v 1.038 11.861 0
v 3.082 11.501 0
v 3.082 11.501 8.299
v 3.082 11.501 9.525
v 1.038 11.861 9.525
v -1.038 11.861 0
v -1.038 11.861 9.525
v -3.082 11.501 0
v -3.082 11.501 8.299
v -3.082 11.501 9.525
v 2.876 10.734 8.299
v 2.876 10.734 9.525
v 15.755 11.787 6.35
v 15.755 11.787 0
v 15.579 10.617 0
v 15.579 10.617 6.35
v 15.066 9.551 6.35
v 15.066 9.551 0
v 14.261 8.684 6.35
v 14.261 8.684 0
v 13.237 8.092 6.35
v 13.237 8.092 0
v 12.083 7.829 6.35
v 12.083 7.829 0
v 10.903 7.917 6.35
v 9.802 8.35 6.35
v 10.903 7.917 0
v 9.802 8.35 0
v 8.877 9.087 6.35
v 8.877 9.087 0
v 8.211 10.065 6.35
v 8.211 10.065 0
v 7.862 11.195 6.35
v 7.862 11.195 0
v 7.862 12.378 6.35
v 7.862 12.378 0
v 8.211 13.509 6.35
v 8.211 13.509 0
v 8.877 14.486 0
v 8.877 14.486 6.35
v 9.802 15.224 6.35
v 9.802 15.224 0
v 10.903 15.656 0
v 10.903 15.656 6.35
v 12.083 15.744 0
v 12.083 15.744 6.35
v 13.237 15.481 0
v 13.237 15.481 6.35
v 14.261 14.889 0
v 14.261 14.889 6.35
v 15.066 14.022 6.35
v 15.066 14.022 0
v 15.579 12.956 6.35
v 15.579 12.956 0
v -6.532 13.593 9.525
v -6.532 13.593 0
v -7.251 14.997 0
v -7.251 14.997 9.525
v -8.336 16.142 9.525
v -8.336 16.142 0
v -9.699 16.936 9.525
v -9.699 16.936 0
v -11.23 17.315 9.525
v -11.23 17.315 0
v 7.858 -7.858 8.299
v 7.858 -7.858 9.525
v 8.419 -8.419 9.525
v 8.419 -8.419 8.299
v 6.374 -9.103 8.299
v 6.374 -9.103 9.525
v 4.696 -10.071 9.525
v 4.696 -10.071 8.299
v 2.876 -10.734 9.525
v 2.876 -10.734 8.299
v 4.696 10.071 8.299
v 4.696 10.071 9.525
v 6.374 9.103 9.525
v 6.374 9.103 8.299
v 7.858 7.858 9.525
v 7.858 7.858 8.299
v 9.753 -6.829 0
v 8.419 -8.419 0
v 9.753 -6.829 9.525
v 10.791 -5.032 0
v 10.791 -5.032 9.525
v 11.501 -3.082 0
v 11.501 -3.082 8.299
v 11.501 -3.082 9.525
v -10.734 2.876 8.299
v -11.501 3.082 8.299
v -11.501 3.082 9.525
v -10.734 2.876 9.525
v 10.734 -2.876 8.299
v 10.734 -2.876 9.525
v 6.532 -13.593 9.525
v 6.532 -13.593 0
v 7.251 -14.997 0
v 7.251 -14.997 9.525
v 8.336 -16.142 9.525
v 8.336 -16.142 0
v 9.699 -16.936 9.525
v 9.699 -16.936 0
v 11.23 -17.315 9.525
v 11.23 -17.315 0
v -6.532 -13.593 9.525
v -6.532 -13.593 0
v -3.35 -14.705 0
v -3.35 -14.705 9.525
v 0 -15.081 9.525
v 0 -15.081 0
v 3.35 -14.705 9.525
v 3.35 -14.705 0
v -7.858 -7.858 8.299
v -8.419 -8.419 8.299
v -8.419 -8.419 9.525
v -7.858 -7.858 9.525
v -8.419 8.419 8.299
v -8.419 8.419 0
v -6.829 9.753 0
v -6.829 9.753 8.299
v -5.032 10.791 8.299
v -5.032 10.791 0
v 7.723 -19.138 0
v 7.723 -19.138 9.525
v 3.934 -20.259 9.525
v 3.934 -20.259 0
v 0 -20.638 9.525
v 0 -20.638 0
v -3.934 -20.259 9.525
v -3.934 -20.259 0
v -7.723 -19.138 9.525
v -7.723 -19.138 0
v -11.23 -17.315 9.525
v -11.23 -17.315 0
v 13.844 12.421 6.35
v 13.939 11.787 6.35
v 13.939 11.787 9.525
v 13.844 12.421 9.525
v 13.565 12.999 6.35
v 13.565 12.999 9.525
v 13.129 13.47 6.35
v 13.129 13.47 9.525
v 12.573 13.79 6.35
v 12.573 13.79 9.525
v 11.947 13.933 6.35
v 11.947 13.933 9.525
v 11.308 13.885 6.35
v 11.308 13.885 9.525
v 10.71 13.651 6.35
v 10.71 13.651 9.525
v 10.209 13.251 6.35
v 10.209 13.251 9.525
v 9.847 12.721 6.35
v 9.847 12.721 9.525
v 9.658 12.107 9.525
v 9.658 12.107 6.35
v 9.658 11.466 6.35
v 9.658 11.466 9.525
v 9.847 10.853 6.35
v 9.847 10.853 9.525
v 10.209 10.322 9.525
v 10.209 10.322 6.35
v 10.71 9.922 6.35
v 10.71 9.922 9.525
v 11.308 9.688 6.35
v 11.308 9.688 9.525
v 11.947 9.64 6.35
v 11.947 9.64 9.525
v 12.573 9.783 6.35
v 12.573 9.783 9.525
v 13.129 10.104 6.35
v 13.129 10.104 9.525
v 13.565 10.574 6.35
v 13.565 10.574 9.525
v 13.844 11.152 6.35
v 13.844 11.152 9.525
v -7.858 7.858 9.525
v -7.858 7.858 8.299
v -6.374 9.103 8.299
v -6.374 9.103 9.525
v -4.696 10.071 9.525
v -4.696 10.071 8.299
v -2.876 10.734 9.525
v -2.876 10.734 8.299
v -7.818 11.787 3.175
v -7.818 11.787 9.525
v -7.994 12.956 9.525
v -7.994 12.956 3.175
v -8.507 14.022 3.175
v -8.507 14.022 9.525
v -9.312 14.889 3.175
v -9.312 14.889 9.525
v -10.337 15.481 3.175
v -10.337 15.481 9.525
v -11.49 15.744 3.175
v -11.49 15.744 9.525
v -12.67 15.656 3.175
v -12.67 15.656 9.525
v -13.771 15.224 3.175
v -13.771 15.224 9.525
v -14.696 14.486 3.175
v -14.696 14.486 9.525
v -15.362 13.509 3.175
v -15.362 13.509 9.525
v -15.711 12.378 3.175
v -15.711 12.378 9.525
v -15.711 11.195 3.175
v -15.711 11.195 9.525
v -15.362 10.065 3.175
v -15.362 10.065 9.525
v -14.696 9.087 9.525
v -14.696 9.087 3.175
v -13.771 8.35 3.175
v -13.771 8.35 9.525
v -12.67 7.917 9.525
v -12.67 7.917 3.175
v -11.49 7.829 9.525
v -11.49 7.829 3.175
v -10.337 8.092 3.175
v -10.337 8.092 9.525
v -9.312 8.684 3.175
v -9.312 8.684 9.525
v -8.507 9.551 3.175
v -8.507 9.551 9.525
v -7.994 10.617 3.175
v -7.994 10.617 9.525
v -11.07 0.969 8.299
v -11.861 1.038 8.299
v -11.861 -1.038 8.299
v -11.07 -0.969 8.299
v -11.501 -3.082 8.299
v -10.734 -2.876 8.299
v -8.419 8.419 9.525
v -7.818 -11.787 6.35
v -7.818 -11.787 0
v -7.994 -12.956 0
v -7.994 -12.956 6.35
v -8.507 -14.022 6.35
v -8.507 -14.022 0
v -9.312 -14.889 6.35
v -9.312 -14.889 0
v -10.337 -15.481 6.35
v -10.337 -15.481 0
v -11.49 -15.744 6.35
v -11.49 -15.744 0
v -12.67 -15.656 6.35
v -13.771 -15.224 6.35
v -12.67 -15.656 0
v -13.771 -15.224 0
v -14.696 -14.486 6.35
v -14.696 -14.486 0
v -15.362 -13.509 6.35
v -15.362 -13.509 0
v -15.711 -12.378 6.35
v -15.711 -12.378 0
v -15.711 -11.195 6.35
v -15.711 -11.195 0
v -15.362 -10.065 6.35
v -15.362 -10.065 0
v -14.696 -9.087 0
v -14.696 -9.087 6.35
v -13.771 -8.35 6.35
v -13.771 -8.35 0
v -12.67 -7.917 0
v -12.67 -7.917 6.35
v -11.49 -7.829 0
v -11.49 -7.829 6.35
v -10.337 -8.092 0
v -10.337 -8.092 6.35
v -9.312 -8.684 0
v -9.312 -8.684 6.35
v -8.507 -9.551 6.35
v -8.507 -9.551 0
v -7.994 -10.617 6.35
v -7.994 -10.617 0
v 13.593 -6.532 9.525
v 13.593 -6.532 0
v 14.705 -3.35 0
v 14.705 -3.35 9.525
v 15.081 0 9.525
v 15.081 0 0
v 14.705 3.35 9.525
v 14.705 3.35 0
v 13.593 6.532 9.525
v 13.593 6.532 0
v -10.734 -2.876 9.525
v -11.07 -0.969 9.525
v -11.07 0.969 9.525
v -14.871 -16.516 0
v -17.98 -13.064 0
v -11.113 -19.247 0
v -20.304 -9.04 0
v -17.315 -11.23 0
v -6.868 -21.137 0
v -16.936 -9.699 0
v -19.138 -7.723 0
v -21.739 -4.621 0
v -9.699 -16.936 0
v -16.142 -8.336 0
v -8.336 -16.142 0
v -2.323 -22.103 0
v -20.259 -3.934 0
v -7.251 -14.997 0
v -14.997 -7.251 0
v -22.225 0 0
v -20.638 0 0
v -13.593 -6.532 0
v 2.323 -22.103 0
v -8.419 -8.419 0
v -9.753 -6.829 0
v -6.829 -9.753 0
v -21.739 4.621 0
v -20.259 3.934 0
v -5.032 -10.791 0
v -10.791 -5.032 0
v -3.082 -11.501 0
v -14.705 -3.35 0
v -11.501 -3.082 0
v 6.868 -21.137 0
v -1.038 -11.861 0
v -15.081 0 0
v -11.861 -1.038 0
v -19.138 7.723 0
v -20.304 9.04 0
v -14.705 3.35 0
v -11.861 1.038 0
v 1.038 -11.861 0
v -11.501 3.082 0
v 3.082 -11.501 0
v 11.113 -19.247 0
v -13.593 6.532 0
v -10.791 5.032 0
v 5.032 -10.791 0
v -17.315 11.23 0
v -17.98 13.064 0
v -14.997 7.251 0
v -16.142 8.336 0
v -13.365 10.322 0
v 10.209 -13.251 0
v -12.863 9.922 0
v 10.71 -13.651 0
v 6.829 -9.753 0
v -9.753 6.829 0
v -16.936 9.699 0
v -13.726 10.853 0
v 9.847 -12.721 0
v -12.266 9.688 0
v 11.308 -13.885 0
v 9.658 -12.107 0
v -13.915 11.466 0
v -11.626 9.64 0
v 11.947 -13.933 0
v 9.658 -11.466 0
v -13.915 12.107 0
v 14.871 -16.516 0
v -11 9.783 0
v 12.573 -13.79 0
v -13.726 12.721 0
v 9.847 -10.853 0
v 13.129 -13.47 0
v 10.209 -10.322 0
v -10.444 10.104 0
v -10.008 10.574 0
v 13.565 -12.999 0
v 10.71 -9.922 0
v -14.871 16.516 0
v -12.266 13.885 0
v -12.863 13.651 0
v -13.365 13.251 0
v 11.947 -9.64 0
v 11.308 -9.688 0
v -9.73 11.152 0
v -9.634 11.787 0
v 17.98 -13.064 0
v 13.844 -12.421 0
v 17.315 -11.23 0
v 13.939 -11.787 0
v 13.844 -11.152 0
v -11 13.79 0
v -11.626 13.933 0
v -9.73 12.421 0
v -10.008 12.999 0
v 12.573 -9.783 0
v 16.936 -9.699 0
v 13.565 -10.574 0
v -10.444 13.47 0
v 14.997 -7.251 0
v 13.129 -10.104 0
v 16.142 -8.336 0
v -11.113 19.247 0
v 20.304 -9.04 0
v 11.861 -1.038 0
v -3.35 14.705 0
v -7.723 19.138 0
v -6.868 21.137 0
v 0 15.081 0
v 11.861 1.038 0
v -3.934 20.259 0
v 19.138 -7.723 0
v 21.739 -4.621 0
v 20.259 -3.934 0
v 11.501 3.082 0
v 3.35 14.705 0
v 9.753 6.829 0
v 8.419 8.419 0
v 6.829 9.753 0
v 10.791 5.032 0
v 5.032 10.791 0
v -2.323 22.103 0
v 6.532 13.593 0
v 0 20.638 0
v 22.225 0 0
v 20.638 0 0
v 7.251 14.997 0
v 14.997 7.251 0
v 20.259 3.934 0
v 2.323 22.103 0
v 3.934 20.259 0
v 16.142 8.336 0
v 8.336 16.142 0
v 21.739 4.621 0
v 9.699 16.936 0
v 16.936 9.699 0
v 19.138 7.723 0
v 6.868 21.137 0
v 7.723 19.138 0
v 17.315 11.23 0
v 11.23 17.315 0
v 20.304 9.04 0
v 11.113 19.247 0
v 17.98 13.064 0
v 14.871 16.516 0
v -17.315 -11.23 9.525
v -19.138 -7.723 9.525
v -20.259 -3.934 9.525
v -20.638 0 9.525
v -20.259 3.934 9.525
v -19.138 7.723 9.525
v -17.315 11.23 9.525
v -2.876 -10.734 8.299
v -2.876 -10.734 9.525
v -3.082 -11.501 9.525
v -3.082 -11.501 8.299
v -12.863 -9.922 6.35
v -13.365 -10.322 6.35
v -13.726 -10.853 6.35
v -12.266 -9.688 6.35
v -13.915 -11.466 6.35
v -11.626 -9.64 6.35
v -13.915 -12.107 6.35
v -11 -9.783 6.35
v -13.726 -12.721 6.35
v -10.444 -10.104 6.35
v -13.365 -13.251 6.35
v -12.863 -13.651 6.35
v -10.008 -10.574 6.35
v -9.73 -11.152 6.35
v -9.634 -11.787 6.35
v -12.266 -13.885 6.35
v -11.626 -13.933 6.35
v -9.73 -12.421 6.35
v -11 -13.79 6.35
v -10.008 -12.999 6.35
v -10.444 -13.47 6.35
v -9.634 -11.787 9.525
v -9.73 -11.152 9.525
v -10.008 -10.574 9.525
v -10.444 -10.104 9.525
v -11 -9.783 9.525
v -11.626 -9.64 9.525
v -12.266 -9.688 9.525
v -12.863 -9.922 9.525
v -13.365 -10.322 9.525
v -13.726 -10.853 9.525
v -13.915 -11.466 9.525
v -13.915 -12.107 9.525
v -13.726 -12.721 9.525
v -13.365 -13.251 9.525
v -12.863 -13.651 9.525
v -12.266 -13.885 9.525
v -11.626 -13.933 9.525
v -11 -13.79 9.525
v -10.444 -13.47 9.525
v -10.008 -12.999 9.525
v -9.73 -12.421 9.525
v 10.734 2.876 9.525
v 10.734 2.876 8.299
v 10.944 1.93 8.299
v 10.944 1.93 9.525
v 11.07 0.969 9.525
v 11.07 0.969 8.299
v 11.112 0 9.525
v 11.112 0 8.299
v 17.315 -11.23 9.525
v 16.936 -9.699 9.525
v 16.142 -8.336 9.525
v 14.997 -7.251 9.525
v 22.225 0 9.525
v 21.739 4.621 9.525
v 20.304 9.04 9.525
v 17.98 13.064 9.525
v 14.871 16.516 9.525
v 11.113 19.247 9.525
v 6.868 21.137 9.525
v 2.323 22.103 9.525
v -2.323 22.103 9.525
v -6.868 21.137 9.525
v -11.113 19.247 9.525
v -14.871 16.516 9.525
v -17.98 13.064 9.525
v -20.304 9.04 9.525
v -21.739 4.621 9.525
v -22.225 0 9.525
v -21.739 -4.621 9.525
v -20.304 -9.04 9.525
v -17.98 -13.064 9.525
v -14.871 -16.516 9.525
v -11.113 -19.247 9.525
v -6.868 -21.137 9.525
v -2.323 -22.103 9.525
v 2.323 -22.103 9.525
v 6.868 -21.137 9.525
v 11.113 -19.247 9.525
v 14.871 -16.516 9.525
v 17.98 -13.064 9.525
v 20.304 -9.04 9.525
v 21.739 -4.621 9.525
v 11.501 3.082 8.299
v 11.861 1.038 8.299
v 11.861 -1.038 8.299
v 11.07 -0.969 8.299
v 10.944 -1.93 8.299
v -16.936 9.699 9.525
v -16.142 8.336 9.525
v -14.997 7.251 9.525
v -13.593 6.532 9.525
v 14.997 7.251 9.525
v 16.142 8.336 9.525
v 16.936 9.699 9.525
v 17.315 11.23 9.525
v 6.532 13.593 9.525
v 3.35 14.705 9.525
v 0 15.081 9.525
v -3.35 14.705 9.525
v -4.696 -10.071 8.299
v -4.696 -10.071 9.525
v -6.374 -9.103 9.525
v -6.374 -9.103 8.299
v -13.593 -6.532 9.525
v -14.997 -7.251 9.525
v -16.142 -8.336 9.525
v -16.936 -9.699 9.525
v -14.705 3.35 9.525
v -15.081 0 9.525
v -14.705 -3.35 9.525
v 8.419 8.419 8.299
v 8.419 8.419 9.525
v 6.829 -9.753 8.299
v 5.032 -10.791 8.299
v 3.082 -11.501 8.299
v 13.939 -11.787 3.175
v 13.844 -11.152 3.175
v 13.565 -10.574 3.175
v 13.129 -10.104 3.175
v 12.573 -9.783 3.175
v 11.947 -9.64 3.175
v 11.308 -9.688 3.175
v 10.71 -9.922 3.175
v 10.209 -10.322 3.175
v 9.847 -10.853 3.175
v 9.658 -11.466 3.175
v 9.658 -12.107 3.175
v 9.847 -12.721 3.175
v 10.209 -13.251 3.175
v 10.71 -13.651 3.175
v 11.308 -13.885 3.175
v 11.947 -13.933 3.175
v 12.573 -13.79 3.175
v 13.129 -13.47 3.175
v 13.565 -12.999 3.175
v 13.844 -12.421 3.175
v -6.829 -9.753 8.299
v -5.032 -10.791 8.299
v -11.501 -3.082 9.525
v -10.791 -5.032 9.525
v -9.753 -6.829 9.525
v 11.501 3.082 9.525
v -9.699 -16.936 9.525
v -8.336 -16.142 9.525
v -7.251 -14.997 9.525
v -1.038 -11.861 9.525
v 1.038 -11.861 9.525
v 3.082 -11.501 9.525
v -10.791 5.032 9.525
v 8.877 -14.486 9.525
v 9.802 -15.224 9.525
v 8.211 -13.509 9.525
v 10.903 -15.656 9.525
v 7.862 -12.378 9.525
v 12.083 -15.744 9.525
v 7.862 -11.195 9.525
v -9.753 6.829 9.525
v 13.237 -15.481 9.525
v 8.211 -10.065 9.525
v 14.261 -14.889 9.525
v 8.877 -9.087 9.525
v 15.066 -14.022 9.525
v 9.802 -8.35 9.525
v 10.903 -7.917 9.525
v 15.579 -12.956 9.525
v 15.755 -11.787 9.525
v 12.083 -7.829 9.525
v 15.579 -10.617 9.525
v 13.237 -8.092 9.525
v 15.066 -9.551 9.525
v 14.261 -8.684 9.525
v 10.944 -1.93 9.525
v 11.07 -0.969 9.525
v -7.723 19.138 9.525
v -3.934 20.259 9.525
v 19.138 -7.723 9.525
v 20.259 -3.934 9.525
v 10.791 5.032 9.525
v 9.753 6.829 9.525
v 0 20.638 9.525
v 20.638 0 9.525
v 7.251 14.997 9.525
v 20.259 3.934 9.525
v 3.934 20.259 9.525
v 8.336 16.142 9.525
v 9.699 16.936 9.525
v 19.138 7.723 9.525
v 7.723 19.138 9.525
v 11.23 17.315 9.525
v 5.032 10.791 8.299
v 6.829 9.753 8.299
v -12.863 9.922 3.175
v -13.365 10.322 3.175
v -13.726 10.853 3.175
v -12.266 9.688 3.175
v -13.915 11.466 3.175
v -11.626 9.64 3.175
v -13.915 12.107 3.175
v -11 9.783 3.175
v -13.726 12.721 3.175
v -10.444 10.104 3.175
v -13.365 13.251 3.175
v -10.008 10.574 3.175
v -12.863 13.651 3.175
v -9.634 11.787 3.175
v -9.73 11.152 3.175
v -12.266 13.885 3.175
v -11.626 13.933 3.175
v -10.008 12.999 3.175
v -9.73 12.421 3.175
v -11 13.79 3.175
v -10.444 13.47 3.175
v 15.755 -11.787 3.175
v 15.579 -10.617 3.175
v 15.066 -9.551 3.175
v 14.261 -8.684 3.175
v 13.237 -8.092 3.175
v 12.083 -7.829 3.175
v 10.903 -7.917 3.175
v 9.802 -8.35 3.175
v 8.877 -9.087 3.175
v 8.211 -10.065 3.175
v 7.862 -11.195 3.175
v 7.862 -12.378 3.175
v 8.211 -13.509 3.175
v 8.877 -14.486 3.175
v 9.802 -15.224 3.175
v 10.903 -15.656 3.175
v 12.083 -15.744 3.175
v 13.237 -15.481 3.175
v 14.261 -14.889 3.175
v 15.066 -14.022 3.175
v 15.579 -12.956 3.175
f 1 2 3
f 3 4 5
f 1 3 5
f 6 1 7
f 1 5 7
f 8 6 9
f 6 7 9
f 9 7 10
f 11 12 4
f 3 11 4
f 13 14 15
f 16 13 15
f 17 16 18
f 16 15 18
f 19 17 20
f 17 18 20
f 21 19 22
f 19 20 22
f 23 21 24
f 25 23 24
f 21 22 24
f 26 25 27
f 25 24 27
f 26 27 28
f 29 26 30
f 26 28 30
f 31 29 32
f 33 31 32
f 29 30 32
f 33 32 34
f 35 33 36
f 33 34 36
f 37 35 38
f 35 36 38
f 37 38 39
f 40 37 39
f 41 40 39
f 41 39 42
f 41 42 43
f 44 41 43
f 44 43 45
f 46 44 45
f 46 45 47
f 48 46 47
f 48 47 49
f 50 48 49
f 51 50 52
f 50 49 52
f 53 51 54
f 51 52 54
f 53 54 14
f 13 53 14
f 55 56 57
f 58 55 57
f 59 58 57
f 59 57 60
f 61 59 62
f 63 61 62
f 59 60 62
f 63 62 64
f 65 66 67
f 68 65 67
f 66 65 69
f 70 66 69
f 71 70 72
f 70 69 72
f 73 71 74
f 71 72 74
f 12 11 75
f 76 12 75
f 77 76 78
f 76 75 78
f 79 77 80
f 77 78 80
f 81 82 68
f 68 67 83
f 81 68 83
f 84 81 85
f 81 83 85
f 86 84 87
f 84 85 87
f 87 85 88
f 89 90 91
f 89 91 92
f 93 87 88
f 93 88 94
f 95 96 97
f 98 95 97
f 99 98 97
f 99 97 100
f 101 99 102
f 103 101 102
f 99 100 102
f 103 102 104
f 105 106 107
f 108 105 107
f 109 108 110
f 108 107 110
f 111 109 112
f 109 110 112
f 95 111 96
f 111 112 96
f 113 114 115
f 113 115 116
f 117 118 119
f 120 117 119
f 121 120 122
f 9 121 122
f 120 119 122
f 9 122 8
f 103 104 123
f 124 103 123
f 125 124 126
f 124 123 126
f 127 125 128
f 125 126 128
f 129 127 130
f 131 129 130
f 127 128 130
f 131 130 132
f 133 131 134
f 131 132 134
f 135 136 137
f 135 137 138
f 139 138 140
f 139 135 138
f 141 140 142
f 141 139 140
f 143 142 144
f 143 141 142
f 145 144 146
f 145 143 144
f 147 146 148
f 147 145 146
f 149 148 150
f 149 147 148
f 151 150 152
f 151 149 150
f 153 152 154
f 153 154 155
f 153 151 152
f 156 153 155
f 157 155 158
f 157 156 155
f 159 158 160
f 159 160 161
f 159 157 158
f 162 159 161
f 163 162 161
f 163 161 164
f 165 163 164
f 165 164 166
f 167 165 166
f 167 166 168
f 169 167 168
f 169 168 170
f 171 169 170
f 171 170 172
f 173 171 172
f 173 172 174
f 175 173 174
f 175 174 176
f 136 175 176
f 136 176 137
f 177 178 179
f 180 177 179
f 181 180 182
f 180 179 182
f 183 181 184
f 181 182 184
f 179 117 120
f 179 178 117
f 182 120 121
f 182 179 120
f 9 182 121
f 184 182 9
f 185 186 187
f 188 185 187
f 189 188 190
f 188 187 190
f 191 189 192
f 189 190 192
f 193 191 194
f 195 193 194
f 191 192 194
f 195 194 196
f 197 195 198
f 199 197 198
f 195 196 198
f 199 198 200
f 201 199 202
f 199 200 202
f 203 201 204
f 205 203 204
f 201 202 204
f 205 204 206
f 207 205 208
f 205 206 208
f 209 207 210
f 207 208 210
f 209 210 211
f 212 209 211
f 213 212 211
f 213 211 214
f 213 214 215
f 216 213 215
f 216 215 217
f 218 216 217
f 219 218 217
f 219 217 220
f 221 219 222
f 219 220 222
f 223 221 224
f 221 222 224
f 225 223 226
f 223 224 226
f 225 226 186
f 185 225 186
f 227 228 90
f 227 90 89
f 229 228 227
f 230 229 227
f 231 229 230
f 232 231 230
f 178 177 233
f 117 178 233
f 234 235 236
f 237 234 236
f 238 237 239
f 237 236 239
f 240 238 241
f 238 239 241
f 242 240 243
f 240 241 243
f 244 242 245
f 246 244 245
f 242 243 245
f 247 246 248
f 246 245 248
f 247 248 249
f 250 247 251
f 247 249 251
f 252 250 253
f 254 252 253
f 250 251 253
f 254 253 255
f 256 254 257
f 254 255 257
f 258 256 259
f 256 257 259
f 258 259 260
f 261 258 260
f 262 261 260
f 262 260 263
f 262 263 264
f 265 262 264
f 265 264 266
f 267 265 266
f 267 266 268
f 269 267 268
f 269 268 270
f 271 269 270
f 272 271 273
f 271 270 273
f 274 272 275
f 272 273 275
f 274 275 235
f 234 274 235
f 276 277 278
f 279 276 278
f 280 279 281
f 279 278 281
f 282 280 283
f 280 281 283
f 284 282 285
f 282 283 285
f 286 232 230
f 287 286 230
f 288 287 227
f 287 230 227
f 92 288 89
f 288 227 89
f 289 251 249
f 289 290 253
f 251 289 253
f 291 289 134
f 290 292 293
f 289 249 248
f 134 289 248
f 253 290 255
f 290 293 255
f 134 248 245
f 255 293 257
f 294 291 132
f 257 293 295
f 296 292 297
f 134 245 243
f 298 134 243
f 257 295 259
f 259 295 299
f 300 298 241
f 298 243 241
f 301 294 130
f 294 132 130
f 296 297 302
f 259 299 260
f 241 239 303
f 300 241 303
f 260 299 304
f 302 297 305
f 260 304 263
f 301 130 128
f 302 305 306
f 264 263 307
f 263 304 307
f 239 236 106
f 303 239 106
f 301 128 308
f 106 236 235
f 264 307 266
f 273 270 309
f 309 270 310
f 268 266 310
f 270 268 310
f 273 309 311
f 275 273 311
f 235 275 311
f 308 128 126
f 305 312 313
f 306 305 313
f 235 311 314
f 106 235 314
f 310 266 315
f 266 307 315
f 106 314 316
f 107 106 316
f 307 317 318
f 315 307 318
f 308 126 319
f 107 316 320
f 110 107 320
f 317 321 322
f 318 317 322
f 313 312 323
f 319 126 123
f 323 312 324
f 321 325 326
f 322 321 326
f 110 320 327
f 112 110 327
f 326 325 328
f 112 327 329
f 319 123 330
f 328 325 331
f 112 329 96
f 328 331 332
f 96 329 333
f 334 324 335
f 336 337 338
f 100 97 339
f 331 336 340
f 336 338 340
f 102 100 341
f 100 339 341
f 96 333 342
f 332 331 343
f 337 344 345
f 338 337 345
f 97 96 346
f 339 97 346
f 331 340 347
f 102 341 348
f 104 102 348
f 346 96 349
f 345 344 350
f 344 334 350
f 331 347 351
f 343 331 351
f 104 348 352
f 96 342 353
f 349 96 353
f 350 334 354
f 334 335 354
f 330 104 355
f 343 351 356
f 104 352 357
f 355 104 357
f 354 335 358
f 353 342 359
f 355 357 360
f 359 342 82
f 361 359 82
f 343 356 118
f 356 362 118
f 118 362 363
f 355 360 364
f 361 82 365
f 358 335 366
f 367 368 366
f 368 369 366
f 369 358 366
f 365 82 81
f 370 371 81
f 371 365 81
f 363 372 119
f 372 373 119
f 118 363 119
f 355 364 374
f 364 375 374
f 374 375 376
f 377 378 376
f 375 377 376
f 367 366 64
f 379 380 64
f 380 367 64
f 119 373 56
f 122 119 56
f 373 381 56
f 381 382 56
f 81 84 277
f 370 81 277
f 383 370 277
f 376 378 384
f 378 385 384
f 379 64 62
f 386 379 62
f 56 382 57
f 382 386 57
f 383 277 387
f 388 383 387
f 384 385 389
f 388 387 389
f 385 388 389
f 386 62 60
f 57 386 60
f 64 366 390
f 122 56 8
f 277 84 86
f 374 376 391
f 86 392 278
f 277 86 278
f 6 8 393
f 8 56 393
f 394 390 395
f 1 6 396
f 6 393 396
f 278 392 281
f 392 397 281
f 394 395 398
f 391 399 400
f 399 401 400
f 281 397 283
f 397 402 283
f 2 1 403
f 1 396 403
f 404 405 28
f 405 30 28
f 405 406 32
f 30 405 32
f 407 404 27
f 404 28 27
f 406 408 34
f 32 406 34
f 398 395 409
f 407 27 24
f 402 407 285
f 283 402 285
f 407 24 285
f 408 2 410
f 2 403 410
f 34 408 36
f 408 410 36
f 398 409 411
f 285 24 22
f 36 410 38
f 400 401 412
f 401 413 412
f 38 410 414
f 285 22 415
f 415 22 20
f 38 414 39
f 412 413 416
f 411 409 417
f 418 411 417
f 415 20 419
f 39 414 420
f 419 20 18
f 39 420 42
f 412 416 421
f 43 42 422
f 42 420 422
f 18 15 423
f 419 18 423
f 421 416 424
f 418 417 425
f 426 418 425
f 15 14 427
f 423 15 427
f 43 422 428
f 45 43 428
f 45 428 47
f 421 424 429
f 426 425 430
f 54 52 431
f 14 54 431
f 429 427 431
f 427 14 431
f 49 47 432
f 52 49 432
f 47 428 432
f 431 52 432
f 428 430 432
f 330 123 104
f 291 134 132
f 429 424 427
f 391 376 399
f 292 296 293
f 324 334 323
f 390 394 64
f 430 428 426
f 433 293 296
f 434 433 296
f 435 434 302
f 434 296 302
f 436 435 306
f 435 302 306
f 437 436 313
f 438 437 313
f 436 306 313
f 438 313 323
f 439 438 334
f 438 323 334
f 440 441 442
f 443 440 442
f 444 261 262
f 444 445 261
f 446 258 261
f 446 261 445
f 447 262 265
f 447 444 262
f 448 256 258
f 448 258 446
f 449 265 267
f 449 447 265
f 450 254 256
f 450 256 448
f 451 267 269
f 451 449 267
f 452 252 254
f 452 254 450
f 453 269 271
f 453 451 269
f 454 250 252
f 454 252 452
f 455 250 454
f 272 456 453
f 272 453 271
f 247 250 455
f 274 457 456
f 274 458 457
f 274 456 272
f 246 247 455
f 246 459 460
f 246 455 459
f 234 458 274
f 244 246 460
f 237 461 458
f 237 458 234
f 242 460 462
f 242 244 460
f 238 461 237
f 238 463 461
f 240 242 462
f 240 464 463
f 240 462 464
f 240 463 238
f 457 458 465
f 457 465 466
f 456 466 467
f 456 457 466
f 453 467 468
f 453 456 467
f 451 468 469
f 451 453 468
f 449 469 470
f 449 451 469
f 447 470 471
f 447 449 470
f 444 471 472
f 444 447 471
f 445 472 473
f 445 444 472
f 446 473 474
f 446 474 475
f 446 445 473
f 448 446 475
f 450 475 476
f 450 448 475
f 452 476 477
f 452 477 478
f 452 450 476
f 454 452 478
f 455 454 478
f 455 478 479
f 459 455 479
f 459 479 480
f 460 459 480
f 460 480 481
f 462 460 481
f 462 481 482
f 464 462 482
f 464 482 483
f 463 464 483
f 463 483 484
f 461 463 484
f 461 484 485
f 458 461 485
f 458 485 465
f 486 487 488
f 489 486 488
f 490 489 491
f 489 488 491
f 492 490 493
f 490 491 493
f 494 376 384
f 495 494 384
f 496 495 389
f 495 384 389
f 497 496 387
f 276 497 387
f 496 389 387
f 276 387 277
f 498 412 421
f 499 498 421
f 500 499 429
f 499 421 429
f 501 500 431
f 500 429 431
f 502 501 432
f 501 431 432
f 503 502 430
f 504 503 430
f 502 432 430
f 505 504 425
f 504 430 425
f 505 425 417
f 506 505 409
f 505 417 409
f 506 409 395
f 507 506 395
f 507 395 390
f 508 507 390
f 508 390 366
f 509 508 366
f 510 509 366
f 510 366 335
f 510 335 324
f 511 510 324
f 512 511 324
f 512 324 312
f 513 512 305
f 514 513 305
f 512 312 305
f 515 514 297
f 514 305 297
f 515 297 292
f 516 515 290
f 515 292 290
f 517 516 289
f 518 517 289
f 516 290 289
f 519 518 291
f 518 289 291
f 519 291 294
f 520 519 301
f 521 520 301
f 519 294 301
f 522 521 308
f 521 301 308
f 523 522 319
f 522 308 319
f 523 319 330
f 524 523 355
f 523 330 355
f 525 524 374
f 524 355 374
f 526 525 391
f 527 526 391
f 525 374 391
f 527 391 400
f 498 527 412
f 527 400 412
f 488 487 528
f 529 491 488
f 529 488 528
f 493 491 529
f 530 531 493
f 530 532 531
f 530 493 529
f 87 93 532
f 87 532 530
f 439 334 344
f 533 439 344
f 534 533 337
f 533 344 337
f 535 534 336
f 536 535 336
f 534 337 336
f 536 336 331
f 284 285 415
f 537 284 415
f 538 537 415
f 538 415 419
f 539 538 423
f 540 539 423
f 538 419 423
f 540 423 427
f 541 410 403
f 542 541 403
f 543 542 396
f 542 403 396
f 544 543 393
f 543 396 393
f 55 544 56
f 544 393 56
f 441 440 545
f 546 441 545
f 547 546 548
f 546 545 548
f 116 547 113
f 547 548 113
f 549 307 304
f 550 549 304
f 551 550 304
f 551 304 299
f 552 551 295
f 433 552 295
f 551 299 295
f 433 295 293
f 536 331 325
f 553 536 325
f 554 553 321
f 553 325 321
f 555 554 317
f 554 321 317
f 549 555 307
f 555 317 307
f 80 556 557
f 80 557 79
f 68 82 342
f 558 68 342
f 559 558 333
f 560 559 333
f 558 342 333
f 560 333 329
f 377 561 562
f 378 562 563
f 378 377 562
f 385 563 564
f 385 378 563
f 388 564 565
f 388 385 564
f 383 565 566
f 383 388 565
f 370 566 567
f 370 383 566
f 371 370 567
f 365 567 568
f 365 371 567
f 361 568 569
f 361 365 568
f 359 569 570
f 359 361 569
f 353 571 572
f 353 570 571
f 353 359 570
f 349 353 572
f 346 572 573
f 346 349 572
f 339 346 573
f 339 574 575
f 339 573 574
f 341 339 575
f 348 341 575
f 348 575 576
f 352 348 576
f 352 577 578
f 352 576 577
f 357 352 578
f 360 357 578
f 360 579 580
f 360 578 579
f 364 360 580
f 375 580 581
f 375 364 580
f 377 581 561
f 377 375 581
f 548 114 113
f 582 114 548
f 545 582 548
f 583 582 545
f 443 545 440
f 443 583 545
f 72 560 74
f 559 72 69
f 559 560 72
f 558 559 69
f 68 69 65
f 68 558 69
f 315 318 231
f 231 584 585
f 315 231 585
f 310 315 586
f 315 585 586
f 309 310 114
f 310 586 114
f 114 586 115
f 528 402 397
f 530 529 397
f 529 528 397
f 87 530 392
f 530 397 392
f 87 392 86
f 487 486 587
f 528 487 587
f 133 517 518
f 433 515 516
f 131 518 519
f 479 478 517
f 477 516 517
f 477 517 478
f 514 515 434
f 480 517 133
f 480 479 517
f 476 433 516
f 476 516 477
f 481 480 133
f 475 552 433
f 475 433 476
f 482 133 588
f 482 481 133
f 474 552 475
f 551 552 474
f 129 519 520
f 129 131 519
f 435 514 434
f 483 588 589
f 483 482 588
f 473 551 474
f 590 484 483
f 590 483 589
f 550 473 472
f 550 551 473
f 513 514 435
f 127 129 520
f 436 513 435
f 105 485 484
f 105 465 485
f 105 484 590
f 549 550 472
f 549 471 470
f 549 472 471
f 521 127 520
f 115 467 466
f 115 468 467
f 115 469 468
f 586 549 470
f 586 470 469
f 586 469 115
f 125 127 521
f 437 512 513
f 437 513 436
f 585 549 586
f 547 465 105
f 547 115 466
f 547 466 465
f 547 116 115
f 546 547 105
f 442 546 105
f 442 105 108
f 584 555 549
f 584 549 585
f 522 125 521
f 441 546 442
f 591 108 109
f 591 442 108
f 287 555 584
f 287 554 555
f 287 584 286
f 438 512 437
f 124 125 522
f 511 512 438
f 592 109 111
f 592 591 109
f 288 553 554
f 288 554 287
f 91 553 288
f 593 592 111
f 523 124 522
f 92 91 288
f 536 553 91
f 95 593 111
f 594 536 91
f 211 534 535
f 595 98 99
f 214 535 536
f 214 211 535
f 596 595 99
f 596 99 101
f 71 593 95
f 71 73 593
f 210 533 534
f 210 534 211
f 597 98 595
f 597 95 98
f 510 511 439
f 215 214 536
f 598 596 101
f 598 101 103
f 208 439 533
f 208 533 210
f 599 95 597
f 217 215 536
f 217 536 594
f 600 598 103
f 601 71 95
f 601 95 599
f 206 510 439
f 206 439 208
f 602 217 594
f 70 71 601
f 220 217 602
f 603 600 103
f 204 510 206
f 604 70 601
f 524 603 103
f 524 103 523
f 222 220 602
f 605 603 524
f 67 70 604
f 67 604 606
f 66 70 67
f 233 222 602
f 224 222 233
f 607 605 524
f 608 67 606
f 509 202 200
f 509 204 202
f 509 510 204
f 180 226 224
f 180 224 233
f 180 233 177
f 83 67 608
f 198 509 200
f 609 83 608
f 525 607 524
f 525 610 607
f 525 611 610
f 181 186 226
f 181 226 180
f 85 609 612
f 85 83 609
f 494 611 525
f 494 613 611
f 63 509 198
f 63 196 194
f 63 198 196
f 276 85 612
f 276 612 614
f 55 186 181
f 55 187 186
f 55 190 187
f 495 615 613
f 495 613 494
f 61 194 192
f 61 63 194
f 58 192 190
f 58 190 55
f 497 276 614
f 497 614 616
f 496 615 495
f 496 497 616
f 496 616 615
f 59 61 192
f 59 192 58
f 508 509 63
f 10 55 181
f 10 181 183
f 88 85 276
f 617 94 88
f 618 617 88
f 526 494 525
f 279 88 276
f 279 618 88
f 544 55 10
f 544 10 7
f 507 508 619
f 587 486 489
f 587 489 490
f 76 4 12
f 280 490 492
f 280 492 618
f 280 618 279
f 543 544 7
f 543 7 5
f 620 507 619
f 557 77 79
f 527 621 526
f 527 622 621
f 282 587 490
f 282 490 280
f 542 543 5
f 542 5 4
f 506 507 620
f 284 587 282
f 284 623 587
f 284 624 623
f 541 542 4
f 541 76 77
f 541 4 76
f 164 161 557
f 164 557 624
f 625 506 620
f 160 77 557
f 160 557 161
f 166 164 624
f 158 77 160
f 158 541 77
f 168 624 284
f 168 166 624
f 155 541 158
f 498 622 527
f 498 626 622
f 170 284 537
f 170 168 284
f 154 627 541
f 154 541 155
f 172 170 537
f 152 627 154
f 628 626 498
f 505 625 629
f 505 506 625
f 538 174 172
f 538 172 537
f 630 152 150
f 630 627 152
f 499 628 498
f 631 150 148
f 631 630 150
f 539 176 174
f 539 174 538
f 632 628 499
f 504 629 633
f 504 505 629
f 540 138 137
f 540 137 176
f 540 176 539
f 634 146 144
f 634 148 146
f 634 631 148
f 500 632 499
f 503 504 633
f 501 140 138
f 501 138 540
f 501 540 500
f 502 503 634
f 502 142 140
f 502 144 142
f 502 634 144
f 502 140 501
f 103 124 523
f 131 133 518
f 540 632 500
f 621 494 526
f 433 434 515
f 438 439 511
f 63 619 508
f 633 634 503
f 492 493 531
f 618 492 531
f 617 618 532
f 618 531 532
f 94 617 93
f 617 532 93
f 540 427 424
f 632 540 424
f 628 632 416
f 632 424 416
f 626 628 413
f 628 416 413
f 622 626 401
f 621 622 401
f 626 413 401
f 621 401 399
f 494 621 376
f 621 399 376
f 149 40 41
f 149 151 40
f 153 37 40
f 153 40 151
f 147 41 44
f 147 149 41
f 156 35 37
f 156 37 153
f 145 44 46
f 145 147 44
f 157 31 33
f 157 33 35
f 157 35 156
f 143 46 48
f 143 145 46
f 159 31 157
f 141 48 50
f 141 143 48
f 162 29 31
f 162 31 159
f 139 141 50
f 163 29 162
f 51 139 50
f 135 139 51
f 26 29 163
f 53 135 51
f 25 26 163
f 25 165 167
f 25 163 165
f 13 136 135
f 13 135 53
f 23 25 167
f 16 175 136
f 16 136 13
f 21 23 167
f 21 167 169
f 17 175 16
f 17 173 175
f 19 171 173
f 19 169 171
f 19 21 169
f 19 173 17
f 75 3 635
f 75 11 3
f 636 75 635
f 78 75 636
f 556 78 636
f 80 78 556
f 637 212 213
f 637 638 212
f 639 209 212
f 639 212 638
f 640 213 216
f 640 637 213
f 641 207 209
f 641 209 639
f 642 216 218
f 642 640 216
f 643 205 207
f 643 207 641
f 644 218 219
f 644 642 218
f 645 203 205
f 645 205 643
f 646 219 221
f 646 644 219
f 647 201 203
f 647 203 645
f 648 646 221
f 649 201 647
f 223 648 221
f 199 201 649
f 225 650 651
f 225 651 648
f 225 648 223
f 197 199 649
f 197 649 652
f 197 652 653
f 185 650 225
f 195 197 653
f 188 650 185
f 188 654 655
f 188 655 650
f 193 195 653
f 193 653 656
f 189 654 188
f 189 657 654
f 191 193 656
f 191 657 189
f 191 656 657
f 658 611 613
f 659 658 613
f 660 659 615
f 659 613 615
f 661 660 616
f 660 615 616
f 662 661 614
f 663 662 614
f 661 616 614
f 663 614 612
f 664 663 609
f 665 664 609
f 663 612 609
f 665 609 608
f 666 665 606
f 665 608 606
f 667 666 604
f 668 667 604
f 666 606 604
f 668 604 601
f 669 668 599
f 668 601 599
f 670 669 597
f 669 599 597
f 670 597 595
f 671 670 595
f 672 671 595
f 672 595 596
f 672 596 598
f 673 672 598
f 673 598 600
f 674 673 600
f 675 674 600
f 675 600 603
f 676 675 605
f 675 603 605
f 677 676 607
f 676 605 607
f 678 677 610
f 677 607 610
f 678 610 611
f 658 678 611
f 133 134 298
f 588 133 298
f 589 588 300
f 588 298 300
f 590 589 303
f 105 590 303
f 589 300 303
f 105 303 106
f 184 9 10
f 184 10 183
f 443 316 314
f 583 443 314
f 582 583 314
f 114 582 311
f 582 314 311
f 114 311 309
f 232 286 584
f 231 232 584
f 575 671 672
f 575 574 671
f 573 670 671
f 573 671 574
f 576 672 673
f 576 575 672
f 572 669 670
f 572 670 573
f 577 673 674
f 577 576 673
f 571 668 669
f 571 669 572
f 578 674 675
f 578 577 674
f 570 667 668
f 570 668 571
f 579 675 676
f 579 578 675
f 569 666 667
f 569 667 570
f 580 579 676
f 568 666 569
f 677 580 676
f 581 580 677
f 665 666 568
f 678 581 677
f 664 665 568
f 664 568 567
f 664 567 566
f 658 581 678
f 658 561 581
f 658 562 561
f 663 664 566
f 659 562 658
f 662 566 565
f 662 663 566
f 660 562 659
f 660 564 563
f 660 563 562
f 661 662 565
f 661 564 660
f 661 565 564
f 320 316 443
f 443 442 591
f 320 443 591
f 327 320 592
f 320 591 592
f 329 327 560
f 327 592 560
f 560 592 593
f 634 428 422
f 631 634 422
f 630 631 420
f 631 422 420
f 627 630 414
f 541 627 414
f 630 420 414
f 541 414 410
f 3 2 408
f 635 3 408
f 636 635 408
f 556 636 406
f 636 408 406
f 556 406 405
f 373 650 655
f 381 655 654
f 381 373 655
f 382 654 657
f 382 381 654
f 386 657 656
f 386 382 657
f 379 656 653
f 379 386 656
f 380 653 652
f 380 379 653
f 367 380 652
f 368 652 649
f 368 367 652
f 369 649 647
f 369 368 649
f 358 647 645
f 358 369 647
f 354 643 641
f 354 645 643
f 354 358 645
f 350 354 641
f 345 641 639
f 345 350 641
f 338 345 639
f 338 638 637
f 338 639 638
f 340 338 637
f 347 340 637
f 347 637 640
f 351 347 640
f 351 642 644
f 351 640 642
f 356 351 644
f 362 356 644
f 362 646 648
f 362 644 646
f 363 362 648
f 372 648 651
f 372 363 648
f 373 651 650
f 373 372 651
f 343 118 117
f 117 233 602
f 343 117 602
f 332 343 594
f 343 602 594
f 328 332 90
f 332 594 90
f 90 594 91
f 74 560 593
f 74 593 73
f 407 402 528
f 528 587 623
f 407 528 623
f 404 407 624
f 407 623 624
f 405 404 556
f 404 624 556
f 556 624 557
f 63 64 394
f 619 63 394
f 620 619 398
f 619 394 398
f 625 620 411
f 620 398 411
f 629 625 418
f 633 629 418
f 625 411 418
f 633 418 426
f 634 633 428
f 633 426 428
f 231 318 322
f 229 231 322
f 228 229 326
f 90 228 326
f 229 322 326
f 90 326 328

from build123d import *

# Parameters (mm, degrees)
F0_R             = 22.225
F0_R_2           = 2.15265
F1_DEPTH         = 9.525
F3_DEPTH         = 9.525
F4_COUNT         = 6
F4_ANGLE         = 300
F6_R             = 11.90625
F7_DEPTH         = 8.29945
F10_R            = 3.96875
F11_DEPTH        = 6.35
F12_R            = 3.96875
F13_DEPTH        = 6.35
F15_DEPTH        = 9.525
F15_COPIES_COUNT = 4


# Not quite as in the source:
# - a pattern or mirror of a feature is missing from the dataset's text; its kind, count and spacing are read off the source's solid


with BuildPart() as f1:
    # F0 (on Top) → F1 (new body)
    with BuildSketch(Plane.XY):
        Circle(F0_R)
        with Locations((-11.7865861589, -11.7865861589)):
            Circle(F0_R_2, mode=Mode.SUBTRACT)
        with Locations((11.7865861589, -11.7865861589)):
            Circle(F0_R_2, mode=Mode.SUBTRACT)
        with Locations((-11.7865861589, 11.7865861589)):
            Circle(F0_R_2, mode=Mode.SUBTRACT)
        with BuildLine():
            ThreePointArc((0, 11.1125), (7.8577241059, 7.8577241059), (11.1125, 0))
            ThreePointArc((11.1125, 0), (-7.8577241059, -7.8577241059), (0, 11.1125))
        make_face(mode=Mode.SUBTRACT)
        with Locations((11.7865861589, 11.7865861589)):
            Circle(F0_R_2, mode=Mode.SUBTRACT)
    extrude(amount=F1_DEPTH)

    # F2 (on face) → F3 (cut, through all)
    with BuildSketch(Plane.XY.offset(9.525)):
        with BuildLine():
            ThreePointArc((-2.8761266387, 10.7338507446), (0, 11.1125), (2.8761266387, 10.7338507446))
            Line((2.8761266387, 10.7338507446), (3.0815642558, 11.5005543693))
            ThreePointArc((3.0815642558, 11.5005543693), (0, 11.90625), (-3.0815642558, 11.5005543693))
            Line((-3.0815642558, 11.5005543693), (-2.8761266387, 10.7338507446))
        make_face()
    f3 = extrude(amount=-F3_DEPTH, mode=Mode.SUBTRACT)

    # F4: F3 ×6 about axis
    f4_axis = Axis((0, 0, 0), (0, 0, -1))
    for i in range(1, F4_COUNT):
        add(f3.rotate(f4_axis, i * F4_ANGLE / (F4_COUNT - 1)), mode=Mode.SUBTRACT)

    # F6 (on face) → F7 (cut, through all)
    with BuildSketch(Plane(origin=(0, 0, 0), x_dir=(1, 0, 0), z_dir=(0, 0, -1))):
        Circle(F6_R)
    extrude(amount=-F7_DEPTH, mode=Mode.SUBTRACT)

    # F10 (on face) → F11 (cut, through all)
    with BuildSketch(Plane(origin=(0, 0, 0), x_dir=(1, 0, 0), z_dir=(0, 0, -1))):
        with Locations((11.7865861589, -11.7865861589)):
            Circle(F10_R)
        with Locations((-11.7865861589, 11.7865861589)):
            Circle(F10_R)
    extrude(amount=-F11_DEPTH, mode=Mode.SUBTRACT)

    # F12 (on face) → F13 (cut, through all)
    with BuildSketch(Plane.XY.offset(9.525)):
        with Locations((-11.7865861589, 11.7865861589)):
            Circle(F12_R)
        with Locations((11.7865861589, -11.7865861589)):
            Circle(F12_R)
    extrude(amount=-F13_DEPTH, mode=Mode.SUBTRACT)

    # F14 (on face) → F15 (cut, through all)
    with BuildSketch(Plane(origin=(0, 0, 0), x_dir=(1, 0, 0), z_dir=(0, 0, -1))):
        with BuildLine():
            ThreePointArc((-11.229543123, 17.3148424047), (-8.3361072587, 16.1415958514), (-6.5322351826, 13.5931602316))
            ThreePointArc((-6.5322351826, 13.5931602316), (0, 15.08125), (6.5322351826, 13.5931602316))
            ThreePointArc((6.5322351826, 13.5931602316), (8.3361072587, 16.1415958514), (11.229543123, 17.3148424047))
            ThreePointArc((11.229543123, 17.3148424047), (0, 20.6375), (-11.229543123, 17.3148424047))
        make_face()
    f15 = extrude(amount=-F15_DEPTH, mode=Mode.SUBTRACT)

    # F15_copies: F15 ×4 about axis
    f15_copies_axis = Axis((0, 0, 0), (0, 0, 1))
    for i in range(1, F15_COPIES_COUNT):
        add(f15.rotate(f15_copies_axis, i * 360 / F15_COPIES_COUNT), mode=Mode.SUBTRACT)


solid = f1.part
